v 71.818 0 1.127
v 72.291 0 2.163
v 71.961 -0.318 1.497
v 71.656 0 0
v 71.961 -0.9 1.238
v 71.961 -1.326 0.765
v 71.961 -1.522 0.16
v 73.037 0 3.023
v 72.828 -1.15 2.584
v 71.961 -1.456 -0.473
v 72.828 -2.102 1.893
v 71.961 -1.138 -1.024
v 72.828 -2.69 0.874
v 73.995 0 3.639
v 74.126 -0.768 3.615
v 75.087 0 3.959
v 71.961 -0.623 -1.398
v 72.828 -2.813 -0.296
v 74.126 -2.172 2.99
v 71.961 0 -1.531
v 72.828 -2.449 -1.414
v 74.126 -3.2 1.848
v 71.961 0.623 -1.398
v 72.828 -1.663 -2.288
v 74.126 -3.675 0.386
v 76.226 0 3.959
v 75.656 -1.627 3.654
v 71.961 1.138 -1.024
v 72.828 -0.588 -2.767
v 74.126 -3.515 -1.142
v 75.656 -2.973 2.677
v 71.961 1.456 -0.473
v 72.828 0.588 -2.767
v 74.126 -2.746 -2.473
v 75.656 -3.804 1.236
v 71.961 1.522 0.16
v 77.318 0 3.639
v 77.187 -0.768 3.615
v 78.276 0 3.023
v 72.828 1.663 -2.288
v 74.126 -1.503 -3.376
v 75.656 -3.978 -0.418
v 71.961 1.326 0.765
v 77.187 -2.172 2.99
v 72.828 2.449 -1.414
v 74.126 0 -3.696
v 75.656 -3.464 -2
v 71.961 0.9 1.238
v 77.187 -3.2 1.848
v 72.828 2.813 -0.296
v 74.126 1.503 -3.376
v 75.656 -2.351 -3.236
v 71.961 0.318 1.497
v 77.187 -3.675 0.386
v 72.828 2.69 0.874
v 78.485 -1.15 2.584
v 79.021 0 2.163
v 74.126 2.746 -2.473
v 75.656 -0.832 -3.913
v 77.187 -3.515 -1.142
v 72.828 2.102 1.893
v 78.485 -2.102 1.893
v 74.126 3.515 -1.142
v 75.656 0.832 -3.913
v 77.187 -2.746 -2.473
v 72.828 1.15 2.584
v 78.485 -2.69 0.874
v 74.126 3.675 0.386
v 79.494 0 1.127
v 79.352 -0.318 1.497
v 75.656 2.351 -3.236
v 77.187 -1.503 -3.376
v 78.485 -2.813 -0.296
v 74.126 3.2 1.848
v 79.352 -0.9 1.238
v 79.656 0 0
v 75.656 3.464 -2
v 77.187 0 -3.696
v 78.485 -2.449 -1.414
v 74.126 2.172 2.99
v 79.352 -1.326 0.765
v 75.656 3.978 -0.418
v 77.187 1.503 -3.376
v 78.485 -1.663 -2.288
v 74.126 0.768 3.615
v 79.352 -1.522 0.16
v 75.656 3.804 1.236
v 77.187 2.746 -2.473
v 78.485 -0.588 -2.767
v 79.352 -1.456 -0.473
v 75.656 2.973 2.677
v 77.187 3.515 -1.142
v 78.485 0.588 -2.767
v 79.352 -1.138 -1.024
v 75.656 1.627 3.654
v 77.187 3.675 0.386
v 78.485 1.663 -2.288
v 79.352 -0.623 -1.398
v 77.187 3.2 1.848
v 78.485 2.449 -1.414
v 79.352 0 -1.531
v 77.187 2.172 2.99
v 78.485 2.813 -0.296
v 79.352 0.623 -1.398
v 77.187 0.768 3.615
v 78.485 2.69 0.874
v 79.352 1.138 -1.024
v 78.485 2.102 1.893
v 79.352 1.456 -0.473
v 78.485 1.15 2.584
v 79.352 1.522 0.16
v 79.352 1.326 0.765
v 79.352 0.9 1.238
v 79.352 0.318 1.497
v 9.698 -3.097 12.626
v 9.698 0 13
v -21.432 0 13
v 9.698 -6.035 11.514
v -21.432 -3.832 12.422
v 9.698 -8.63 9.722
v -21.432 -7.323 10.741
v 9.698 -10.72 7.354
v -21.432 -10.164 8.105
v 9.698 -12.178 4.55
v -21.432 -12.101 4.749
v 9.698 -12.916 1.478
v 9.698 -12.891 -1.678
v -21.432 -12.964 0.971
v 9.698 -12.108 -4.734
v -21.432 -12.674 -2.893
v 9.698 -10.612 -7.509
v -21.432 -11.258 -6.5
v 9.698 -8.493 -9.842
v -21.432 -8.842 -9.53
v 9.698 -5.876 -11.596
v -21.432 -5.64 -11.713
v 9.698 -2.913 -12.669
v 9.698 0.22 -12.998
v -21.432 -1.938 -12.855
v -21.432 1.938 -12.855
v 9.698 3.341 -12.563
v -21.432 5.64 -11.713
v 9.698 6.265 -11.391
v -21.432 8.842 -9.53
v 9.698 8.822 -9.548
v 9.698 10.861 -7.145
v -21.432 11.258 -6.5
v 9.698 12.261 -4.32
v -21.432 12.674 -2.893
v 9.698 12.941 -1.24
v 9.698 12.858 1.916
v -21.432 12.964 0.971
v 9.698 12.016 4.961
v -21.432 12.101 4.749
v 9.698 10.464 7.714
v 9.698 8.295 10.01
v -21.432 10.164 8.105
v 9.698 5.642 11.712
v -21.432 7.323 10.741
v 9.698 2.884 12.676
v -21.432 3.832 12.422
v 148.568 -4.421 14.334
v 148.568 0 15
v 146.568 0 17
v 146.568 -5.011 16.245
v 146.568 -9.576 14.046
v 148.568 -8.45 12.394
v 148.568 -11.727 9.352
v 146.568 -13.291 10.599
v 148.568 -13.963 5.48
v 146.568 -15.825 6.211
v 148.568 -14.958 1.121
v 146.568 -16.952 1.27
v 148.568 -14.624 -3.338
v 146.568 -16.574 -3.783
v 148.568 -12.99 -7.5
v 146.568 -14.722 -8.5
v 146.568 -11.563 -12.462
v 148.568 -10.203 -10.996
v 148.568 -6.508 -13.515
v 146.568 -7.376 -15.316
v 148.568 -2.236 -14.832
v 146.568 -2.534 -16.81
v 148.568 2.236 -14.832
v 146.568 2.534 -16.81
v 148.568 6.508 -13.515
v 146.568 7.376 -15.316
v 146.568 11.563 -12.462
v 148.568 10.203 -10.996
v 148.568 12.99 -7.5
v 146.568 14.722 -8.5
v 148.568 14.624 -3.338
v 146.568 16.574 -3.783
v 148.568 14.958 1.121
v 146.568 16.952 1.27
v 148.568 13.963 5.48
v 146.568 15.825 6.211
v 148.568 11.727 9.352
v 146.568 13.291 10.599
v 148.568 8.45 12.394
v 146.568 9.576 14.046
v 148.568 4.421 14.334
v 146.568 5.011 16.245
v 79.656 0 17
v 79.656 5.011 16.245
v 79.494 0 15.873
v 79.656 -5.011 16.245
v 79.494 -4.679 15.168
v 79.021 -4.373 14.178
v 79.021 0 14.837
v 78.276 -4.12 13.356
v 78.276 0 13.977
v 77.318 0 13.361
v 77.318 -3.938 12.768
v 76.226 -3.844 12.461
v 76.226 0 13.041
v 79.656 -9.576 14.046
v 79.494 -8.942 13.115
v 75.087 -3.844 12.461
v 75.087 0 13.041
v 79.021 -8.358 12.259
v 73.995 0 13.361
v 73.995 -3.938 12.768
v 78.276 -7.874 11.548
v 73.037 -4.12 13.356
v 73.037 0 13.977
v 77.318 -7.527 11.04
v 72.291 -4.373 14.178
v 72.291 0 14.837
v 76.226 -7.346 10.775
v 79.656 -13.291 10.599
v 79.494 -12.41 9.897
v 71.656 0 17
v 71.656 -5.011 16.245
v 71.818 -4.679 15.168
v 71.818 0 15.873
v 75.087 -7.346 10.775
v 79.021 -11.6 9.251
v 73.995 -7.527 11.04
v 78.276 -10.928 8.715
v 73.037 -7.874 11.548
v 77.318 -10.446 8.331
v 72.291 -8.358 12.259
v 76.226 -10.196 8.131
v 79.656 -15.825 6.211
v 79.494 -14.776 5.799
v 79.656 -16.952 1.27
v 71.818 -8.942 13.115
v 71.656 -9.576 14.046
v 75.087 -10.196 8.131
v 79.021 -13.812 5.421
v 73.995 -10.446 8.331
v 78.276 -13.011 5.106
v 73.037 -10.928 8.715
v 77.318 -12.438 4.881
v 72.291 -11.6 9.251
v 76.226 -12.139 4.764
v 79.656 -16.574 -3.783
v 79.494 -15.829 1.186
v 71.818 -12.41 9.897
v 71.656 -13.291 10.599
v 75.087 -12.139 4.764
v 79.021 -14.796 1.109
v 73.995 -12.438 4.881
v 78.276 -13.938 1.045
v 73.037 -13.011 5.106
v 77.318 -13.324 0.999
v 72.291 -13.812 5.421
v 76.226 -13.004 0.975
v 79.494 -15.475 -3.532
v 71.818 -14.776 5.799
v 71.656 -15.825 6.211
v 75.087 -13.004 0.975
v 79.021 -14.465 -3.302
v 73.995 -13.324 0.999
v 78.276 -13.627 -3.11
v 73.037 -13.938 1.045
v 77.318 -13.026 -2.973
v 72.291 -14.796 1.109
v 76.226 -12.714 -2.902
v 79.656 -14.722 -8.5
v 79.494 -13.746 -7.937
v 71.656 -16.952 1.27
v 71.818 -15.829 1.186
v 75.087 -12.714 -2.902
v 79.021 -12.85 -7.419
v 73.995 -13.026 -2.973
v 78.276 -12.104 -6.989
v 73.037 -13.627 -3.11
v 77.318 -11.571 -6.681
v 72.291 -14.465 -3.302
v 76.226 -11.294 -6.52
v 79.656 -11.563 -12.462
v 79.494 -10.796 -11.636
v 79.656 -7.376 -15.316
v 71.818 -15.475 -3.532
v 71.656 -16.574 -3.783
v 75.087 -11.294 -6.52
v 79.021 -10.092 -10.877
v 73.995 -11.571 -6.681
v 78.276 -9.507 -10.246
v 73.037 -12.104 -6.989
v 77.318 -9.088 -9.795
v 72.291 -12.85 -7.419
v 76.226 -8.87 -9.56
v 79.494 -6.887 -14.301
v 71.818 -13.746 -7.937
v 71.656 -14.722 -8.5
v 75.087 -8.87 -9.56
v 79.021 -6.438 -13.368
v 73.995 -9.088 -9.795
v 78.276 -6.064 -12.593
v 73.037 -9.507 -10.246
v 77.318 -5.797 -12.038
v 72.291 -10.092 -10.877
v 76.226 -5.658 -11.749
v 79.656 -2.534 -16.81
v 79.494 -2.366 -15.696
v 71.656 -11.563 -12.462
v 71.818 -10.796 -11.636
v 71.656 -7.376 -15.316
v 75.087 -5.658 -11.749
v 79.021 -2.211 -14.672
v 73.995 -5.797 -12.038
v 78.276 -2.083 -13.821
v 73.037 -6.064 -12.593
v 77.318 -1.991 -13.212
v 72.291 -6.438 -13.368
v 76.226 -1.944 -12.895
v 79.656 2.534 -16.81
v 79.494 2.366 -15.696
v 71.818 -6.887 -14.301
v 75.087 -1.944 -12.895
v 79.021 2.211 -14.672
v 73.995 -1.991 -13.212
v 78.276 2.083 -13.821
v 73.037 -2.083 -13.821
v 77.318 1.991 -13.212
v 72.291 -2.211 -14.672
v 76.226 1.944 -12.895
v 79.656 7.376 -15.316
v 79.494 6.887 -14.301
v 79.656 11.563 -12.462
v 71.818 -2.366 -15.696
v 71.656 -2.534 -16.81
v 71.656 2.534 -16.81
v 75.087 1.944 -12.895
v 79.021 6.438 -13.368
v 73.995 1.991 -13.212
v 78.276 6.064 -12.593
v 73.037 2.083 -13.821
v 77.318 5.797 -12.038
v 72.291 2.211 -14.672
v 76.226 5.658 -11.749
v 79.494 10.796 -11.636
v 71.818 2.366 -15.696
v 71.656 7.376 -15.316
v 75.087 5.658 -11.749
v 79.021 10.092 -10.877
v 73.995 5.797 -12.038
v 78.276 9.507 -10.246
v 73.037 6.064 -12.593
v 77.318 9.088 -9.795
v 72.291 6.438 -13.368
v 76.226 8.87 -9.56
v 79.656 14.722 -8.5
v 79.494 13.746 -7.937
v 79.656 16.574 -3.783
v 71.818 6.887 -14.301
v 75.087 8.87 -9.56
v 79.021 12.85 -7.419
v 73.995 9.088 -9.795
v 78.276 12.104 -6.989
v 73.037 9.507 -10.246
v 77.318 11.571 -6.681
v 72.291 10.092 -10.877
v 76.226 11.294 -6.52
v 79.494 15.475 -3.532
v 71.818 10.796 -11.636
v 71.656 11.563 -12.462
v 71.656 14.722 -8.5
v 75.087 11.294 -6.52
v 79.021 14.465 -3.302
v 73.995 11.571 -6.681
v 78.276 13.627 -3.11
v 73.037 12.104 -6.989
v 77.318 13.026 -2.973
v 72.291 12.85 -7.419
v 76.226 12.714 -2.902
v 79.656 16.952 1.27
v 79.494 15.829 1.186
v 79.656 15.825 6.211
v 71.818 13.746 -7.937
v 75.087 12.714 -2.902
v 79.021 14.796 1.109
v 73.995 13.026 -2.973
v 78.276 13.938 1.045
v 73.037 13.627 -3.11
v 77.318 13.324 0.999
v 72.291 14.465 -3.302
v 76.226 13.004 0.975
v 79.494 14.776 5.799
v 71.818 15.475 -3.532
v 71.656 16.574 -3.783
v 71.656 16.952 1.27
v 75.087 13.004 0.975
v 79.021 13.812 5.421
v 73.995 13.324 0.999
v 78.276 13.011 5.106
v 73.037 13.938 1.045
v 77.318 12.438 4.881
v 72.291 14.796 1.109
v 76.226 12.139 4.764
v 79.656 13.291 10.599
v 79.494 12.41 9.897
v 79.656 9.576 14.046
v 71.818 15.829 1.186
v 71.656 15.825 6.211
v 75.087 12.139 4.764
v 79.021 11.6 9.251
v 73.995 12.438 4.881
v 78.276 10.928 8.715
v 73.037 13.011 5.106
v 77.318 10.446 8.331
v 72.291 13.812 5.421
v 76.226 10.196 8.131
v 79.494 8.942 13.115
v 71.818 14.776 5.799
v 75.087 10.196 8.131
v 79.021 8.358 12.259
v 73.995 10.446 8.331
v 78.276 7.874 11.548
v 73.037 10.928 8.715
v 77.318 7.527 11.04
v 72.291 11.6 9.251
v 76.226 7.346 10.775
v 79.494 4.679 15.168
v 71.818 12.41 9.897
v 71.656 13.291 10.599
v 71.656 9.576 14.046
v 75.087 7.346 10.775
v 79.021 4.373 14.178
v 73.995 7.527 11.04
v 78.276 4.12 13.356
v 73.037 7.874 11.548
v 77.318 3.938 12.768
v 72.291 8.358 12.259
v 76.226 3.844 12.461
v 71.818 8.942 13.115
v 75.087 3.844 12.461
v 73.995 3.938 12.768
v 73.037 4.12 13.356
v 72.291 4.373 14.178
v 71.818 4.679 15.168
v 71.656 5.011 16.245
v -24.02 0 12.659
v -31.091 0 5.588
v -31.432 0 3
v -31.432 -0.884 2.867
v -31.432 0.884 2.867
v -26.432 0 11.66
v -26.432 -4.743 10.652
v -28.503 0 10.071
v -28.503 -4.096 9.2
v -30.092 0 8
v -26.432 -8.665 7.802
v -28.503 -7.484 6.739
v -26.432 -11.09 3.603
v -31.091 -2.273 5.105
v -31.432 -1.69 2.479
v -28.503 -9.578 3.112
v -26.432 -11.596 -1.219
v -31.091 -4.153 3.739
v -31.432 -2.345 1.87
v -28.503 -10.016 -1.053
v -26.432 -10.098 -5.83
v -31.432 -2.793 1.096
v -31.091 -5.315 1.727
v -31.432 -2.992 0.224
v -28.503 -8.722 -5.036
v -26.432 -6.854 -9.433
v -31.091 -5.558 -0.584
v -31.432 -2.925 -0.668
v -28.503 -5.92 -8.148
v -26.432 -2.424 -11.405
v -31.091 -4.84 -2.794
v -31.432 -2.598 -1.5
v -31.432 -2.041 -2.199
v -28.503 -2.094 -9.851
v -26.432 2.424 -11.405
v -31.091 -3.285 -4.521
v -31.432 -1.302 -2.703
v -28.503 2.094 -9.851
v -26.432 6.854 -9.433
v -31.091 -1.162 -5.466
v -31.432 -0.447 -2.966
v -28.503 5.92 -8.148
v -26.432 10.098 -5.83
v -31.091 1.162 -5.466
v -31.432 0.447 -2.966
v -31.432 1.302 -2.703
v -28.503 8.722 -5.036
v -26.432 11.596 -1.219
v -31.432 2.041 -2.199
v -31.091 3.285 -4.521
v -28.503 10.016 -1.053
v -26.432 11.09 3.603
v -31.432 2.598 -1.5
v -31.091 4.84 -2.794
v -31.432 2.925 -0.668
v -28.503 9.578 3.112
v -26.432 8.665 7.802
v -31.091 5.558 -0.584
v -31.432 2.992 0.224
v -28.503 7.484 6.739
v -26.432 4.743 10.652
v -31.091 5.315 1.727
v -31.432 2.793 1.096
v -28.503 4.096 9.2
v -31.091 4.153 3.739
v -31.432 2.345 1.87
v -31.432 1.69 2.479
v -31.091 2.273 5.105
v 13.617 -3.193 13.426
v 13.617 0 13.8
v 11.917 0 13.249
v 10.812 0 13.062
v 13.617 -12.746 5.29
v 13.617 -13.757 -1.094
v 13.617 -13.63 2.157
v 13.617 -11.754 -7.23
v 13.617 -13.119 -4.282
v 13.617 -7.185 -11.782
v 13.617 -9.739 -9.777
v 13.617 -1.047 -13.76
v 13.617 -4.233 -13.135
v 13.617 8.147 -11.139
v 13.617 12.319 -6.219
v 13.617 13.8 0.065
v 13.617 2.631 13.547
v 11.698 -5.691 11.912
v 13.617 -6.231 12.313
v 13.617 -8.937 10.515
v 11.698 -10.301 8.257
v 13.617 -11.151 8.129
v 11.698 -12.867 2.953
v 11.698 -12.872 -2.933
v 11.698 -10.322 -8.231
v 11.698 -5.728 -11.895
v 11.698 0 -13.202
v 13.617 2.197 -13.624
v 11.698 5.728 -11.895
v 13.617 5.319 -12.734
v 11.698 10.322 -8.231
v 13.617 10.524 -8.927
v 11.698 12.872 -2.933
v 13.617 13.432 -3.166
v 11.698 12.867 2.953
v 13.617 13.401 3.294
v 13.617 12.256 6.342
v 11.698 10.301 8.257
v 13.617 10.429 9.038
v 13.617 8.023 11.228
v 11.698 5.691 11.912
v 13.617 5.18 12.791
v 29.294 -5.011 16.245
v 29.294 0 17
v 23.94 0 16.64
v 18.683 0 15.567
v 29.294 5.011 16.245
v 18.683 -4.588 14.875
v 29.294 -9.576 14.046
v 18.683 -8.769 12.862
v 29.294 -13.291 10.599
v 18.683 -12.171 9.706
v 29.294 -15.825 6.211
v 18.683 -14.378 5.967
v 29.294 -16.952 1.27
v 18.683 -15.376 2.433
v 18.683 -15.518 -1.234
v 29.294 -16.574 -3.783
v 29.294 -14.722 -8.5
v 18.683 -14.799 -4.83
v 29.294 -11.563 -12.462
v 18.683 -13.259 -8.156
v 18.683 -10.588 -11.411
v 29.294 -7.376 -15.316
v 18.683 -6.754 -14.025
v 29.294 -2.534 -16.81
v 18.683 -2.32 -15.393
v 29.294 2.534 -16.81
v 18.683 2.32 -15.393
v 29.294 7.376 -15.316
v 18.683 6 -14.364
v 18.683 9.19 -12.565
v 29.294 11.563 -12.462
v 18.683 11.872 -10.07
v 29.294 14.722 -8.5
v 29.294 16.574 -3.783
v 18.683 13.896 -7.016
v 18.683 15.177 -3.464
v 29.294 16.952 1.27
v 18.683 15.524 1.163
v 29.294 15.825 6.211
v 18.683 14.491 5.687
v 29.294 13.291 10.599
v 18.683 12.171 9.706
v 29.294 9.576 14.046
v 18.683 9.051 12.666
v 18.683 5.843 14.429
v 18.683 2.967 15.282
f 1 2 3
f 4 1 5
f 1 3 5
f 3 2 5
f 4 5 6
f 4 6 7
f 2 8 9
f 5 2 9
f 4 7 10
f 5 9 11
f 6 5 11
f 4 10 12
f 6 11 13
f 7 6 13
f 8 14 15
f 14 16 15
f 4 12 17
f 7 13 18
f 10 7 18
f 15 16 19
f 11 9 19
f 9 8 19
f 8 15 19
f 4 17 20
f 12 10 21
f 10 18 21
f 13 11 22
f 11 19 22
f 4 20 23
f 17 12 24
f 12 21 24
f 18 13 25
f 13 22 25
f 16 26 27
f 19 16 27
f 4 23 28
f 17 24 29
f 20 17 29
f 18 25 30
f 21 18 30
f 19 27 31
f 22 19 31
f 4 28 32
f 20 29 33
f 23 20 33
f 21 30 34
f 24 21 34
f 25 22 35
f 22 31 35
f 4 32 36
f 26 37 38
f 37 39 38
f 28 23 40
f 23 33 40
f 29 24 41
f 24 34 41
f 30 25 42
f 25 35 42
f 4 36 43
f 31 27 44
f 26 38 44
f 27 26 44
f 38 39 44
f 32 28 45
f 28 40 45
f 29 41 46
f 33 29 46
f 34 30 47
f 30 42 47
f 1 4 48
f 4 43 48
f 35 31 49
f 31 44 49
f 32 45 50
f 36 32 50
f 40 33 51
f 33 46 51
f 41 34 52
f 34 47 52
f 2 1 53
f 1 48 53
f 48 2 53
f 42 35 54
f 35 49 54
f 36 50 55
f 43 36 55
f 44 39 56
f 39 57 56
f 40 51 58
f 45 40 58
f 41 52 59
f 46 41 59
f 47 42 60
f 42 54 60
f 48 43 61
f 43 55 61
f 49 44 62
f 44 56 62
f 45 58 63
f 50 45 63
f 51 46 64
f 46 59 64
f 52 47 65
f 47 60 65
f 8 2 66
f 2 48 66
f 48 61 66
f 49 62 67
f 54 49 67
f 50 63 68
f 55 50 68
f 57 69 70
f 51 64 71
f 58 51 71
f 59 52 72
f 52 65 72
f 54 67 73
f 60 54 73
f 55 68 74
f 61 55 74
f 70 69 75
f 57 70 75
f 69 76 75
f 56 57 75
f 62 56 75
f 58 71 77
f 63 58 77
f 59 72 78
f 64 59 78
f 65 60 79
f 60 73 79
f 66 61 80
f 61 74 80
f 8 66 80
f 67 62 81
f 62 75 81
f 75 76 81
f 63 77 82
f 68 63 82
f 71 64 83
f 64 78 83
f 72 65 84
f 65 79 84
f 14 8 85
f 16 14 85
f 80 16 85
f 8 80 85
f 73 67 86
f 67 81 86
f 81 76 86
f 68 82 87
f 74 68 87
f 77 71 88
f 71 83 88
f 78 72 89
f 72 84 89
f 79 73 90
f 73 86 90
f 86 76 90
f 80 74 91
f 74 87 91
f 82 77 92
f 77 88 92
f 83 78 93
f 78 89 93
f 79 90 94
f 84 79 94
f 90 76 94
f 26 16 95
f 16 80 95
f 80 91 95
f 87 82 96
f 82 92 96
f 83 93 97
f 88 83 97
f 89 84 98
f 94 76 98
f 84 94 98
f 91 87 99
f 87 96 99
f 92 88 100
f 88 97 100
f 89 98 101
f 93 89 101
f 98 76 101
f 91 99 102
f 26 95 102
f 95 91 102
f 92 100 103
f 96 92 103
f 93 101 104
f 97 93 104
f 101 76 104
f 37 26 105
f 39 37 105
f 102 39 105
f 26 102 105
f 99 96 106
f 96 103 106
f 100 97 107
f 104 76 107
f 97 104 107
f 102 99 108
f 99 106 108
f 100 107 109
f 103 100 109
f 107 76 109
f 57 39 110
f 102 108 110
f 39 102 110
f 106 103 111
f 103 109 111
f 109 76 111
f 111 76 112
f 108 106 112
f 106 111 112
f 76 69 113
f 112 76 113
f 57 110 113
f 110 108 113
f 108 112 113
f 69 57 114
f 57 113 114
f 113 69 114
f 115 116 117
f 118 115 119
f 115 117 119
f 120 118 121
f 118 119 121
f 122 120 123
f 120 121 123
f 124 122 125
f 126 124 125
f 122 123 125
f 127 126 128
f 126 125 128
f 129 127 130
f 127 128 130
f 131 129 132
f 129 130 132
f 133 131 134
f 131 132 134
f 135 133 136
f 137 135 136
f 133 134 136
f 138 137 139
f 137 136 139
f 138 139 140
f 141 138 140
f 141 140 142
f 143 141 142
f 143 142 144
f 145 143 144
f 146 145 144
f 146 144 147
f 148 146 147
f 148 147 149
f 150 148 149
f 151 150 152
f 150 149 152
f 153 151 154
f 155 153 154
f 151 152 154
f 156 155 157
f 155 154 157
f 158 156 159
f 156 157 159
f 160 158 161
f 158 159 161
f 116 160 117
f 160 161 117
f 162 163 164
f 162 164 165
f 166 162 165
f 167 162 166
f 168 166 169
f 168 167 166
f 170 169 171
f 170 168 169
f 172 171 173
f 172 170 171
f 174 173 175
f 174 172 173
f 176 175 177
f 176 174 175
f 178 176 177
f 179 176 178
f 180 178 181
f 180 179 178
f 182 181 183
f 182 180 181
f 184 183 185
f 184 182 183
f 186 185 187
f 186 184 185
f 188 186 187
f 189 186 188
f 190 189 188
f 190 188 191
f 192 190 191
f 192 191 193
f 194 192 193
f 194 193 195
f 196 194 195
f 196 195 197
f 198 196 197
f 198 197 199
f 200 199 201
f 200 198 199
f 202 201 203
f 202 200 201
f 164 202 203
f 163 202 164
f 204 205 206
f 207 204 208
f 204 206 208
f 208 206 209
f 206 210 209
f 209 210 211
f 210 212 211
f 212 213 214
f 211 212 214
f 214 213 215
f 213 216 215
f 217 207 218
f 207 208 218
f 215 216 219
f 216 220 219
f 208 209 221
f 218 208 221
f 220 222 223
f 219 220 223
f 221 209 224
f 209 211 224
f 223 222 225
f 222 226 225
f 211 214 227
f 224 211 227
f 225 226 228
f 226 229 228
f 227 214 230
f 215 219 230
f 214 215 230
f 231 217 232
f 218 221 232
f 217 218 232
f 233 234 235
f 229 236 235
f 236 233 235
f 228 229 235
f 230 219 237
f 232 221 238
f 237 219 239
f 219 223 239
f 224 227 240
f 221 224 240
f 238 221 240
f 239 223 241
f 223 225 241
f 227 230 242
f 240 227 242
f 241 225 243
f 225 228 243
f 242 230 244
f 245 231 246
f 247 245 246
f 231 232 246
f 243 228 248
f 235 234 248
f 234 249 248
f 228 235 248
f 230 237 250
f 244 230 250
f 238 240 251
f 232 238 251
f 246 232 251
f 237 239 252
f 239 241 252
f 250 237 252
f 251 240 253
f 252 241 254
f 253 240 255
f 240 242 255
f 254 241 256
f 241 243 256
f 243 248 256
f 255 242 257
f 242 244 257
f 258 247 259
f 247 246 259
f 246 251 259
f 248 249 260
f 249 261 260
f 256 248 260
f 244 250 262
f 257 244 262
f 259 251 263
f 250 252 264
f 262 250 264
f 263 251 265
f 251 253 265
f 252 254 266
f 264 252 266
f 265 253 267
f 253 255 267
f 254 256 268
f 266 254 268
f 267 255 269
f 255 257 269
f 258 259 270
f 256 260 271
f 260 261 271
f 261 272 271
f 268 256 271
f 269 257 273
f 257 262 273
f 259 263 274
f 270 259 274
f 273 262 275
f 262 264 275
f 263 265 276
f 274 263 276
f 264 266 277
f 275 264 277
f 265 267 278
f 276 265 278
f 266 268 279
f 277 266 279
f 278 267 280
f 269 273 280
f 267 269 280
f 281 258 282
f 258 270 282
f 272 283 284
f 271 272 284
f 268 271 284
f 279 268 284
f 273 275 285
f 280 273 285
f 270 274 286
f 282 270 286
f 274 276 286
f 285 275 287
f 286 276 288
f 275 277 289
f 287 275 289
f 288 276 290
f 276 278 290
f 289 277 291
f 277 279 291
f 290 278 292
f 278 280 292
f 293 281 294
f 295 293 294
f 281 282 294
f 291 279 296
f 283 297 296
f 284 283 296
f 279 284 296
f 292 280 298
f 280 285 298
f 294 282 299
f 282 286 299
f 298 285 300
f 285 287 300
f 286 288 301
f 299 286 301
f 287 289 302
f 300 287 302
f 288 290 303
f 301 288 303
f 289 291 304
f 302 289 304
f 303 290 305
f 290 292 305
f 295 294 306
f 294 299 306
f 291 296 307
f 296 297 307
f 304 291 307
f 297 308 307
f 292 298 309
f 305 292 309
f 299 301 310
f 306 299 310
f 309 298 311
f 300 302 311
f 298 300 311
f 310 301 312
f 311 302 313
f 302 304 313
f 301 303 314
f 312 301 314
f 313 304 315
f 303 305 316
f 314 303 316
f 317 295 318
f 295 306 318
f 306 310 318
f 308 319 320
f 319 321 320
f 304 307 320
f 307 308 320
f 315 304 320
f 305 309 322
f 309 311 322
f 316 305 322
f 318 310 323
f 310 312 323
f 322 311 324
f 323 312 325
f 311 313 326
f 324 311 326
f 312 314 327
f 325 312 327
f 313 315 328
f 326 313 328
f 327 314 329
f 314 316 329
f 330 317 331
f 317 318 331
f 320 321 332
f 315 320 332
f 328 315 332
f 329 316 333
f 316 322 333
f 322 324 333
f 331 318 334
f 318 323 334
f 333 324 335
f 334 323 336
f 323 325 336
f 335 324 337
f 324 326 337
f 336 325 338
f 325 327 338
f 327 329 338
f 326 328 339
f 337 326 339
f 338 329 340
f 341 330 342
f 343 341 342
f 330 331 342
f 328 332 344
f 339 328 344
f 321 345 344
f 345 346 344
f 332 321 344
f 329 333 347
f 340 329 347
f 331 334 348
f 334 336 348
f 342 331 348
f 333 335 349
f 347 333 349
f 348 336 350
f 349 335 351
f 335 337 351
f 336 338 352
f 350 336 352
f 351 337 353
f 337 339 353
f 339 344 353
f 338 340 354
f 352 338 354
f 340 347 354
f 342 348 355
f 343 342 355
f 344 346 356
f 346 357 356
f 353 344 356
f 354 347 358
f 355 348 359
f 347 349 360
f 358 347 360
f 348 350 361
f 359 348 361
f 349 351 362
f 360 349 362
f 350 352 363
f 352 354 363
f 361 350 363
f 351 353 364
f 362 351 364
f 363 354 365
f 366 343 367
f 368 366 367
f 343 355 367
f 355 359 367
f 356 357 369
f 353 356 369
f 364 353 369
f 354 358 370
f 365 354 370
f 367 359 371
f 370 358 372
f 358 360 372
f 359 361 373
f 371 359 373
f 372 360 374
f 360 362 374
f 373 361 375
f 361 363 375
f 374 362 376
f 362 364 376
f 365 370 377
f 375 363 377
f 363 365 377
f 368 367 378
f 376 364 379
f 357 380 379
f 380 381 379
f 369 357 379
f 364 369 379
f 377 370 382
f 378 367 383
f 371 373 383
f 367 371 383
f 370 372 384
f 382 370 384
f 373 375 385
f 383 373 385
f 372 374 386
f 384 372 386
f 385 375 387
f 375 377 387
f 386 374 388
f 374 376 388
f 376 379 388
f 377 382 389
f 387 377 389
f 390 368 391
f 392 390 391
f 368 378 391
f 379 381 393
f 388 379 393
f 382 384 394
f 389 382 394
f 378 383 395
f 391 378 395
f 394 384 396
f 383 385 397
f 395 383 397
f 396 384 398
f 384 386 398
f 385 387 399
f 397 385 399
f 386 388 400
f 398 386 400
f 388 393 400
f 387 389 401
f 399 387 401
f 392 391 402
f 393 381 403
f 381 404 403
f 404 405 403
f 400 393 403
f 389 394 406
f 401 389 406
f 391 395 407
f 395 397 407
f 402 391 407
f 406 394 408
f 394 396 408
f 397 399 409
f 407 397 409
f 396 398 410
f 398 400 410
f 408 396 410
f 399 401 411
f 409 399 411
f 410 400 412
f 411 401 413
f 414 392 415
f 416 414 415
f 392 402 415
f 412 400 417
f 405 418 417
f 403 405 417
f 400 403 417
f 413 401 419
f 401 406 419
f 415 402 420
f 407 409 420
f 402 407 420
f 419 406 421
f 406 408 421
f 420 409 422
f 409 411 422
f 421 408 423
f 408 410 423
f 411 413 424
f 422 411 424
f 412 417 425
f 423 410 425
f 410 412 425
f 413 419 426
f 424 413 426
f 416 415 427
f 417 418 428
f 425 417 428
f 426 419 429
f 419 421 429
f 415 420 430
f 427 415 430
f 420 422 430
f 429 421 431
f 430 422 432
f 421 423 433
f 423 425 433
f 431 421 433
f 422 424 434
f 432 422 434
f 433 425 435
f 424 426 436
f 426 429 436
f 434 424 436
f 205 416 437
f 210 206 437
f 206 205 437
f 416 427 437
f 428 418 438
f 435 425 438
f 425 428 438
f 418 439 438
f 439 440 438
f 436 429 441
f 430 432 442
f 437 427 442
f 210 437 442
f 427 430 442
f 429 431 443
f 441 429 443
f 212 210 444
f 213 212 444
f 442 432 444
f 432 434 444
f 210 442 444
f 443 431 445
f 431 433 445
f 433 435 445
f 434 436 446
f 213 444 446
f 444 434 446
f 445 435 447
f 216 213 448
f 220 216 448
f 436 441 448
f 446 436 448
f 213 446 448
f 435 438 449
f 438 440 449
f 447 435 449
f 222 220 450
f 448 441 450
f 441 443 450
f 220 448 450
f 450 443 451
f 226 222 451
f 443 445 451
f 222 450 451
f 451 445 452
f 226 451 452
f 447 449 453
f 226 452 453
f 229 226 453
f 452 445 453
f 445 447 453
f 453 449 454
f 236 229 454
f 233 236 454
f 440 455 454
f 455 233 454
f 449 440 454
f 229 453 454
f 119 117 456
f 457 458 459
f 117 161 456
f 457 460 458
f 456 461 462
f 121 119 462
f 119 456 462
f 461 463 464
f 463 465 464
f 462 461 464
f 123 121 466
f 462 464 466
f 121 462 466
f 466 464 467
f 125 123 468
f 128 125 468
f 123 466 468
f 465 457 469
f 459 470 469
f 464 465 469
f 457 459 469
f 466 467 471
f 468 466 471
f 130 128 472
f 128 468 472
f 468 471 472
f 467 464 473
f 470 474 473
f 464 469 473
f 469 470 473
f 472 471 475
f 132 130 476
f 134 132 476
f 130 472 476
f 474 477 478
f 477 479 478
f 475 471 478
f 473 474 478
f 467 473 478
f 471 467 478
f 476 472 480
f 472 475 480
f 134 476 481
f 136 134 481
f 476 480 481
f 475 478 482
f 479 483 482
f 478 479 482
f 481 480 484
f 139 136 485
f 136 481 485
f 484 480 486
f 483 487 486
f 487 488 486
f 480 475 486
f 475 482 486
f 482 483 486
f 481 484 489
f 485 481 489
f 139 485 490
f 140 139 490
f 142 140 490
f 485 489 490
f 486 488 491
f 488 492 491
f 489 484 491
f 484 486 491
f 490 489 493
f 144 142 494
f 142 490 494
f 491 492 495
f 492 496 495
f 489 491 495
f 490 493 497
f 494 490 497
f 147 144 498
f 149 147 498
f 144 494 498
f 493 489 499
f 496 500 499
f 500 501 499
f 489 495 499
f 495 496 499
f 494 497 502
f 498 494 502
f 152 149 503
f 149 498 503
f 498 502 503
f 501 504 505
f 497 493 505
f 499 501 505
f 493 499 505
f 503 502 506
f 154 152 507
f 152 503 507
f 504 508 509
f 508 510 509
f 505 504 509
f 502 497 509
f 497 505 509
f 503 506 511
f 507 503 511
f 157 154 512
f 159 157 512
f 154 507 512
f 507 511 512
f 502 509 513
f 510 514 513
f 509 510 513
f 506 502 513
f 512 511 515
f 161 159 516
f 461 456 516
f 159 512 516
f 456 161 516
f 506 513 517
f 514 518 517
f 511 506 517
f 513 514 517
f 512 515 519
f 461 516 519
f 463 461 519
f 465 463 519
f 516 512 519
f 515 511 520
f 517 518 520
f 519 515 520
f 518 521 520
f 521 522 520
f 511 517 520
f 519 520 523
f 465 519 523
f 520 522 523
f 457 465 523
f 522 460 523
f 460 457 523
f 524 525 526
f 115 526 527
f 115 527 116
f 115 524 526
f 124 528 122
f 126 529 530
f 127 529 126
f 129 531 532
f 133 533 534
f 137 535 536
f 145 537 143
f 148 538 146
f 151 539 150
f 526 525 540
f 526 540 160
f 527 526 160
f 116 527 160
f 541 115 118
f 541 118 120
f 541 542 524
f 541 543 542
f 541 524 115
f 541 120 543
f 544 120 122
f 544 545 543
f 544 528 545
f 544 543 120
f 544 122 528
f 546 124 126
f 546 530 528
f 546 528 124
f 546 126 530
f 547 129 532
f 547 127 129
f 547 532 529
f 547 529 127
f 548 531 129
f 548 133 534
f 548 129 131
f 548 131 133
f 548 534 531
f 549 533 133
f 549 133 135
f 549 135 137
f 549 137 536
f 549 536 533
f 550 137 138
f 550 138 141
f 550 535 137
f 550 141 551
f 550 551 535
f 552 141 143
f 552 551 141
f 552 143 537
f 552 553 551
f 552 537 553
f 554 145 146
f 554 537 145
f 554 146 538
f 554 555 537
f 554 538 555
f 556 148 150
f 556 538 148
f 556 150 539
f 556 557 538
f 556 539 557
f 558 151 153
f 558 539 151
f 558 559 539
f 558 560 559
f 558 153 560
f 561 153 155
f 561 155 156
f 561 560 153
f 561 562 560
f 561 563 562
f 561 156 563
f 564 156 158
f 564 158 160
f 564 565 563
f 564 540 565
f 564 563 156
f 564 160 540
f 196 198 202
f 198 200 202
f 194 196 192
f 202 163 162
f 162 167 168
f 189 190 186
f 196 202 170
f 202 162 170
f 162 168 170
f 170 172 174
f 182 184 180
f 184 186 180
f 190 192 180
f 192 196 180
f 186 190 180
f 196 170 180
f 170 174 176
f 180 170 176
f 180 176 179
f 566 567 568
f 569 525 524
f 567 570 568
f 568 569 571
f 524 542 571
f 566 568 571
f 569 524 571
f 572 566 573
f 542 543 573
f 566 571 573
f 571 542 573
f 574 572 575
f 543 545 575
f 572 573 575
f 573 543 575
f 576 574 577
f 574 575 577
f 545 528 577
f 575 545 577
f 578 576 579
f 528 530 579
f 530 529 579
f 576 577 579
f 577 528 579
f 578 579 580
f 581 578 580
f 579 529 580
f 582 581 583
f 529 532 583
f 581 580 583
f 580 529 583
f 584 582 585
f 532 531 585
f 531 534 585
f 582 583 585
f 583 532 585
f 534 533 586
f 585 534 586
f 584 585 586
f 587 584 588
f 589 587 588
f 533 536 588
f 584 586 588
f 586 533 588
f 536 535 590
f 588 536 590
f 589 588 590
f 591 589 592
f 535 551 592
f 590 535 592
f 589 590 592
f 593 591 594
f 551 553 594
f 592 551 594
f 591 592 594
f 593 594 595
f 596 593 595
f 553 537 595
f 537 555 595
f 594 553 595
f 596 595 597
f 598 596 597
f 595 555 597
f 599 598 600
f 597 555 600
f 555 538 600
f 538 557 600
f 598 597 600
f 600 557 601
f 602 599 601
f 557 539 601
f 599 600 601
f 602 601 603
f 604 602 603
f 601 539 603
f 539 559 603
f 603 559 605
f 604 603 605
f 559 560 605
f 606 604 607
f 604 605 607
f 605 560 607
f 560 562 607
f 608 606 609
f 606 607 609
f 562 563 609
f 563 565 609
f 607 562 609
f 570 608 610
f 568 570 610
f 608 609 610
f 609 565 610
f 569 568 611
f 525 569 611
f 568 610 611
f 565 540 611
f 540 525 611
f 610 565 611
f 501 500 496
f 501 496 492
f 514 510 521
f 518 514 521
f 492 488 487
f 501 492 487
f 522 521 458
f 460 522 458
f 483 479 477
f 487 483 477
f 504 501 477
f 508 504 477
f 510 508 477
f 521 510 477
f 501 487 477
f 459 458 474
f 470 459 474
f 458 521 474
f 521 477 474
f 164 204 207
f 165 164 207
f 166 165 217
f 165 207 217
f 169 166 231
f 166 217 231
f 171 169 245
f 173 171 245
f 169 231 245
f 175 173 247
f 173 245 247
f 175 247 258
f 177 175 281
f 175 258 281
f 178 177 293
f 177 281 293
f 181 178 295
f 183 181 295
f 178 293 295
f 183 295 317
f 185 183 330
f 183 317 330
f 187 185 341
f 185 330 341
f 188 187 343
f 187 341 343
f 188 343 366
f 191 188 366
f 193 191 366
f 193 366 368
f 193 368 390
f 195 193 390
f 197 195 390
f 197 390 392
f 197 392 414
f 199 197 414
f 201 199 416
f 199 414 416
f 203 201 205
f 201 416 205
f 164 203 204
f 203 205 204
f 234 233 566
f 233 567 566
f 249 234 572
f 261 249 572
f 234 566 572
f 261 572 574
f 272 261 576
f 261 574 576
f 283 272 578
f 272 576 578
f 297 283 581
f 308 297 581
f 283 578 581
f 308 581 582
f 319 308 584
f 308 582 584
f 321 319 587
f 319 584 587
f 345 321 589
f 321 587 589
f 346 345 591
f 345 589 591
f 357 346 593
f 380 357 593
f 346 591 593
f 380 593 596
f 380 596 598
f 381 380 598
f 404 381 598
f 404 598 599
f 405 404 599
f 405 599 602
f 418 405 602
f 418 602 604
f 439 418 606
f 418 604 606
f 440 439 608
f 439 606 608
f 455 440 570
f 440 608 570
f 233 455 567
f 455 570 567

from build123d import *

# Parameters (mm, degrees)
FILLET1_R     = 10
CHAMFER1_SIZE = 2


with BuildPart() as part:
    # Sketch1 → Revolve1 (revolve)
    with BuildSketch(Plane.XY, mode=Mode.PRIVATE) as revolve1_sk:
        with BuildLine():
            Line((0, 0), (71.656242166, 0))
            ThreePointArc((71.656242166, 0), (75.656242166, 4), (79.656242166, 0))
            Line((79.656242166, 0), (148.568475549, 0))
            Line((148.568475549, 0), (148.568475549, 17))
            Line((148.568475549, 17), (79.656242166, 17))
            ThreePointArc((79.656242166, 17), (75.656242166, 13), (71.656242166, 17))
            Line((71.656242166, 17), (29.293635646, 17))
            ThreePointArc((29.293635646, 17), (20.349363736, 15.987177379), (11.858039872, 13))
            Line((11.858039872, 13), (-31.431524451, 13))
            Line((-31.431524451, 13), (-31.431524451, 0))
            Line((-31.431524451, 0), (0, 0))
        make_face()
    revolve(revolve1_sk.sketch.rotate(Axis((0, 0, 0), (1, 0, 0)), 90), axis=Axis((0, 0, 0), (1, 0, 0)))

    # Fillet1
    fillet1_edges = [part.edges().sort_by_distance(p)[0] for p in [
        (11.858039872, 0, -13),
        (-31.431524451, 0, -13),
    ]]
    fillet(fillet1_edges, radius=FILLET1_R)

    # Chamfer1
    chamfer1_edges = [part.edges().sort_by_distance(p)[0] for p in [
        (148.568475549, 0, -17),
    ]]
    chamfer(chamfer1_edges, length=CHAMFER1_SIZE)


solid = part.part
